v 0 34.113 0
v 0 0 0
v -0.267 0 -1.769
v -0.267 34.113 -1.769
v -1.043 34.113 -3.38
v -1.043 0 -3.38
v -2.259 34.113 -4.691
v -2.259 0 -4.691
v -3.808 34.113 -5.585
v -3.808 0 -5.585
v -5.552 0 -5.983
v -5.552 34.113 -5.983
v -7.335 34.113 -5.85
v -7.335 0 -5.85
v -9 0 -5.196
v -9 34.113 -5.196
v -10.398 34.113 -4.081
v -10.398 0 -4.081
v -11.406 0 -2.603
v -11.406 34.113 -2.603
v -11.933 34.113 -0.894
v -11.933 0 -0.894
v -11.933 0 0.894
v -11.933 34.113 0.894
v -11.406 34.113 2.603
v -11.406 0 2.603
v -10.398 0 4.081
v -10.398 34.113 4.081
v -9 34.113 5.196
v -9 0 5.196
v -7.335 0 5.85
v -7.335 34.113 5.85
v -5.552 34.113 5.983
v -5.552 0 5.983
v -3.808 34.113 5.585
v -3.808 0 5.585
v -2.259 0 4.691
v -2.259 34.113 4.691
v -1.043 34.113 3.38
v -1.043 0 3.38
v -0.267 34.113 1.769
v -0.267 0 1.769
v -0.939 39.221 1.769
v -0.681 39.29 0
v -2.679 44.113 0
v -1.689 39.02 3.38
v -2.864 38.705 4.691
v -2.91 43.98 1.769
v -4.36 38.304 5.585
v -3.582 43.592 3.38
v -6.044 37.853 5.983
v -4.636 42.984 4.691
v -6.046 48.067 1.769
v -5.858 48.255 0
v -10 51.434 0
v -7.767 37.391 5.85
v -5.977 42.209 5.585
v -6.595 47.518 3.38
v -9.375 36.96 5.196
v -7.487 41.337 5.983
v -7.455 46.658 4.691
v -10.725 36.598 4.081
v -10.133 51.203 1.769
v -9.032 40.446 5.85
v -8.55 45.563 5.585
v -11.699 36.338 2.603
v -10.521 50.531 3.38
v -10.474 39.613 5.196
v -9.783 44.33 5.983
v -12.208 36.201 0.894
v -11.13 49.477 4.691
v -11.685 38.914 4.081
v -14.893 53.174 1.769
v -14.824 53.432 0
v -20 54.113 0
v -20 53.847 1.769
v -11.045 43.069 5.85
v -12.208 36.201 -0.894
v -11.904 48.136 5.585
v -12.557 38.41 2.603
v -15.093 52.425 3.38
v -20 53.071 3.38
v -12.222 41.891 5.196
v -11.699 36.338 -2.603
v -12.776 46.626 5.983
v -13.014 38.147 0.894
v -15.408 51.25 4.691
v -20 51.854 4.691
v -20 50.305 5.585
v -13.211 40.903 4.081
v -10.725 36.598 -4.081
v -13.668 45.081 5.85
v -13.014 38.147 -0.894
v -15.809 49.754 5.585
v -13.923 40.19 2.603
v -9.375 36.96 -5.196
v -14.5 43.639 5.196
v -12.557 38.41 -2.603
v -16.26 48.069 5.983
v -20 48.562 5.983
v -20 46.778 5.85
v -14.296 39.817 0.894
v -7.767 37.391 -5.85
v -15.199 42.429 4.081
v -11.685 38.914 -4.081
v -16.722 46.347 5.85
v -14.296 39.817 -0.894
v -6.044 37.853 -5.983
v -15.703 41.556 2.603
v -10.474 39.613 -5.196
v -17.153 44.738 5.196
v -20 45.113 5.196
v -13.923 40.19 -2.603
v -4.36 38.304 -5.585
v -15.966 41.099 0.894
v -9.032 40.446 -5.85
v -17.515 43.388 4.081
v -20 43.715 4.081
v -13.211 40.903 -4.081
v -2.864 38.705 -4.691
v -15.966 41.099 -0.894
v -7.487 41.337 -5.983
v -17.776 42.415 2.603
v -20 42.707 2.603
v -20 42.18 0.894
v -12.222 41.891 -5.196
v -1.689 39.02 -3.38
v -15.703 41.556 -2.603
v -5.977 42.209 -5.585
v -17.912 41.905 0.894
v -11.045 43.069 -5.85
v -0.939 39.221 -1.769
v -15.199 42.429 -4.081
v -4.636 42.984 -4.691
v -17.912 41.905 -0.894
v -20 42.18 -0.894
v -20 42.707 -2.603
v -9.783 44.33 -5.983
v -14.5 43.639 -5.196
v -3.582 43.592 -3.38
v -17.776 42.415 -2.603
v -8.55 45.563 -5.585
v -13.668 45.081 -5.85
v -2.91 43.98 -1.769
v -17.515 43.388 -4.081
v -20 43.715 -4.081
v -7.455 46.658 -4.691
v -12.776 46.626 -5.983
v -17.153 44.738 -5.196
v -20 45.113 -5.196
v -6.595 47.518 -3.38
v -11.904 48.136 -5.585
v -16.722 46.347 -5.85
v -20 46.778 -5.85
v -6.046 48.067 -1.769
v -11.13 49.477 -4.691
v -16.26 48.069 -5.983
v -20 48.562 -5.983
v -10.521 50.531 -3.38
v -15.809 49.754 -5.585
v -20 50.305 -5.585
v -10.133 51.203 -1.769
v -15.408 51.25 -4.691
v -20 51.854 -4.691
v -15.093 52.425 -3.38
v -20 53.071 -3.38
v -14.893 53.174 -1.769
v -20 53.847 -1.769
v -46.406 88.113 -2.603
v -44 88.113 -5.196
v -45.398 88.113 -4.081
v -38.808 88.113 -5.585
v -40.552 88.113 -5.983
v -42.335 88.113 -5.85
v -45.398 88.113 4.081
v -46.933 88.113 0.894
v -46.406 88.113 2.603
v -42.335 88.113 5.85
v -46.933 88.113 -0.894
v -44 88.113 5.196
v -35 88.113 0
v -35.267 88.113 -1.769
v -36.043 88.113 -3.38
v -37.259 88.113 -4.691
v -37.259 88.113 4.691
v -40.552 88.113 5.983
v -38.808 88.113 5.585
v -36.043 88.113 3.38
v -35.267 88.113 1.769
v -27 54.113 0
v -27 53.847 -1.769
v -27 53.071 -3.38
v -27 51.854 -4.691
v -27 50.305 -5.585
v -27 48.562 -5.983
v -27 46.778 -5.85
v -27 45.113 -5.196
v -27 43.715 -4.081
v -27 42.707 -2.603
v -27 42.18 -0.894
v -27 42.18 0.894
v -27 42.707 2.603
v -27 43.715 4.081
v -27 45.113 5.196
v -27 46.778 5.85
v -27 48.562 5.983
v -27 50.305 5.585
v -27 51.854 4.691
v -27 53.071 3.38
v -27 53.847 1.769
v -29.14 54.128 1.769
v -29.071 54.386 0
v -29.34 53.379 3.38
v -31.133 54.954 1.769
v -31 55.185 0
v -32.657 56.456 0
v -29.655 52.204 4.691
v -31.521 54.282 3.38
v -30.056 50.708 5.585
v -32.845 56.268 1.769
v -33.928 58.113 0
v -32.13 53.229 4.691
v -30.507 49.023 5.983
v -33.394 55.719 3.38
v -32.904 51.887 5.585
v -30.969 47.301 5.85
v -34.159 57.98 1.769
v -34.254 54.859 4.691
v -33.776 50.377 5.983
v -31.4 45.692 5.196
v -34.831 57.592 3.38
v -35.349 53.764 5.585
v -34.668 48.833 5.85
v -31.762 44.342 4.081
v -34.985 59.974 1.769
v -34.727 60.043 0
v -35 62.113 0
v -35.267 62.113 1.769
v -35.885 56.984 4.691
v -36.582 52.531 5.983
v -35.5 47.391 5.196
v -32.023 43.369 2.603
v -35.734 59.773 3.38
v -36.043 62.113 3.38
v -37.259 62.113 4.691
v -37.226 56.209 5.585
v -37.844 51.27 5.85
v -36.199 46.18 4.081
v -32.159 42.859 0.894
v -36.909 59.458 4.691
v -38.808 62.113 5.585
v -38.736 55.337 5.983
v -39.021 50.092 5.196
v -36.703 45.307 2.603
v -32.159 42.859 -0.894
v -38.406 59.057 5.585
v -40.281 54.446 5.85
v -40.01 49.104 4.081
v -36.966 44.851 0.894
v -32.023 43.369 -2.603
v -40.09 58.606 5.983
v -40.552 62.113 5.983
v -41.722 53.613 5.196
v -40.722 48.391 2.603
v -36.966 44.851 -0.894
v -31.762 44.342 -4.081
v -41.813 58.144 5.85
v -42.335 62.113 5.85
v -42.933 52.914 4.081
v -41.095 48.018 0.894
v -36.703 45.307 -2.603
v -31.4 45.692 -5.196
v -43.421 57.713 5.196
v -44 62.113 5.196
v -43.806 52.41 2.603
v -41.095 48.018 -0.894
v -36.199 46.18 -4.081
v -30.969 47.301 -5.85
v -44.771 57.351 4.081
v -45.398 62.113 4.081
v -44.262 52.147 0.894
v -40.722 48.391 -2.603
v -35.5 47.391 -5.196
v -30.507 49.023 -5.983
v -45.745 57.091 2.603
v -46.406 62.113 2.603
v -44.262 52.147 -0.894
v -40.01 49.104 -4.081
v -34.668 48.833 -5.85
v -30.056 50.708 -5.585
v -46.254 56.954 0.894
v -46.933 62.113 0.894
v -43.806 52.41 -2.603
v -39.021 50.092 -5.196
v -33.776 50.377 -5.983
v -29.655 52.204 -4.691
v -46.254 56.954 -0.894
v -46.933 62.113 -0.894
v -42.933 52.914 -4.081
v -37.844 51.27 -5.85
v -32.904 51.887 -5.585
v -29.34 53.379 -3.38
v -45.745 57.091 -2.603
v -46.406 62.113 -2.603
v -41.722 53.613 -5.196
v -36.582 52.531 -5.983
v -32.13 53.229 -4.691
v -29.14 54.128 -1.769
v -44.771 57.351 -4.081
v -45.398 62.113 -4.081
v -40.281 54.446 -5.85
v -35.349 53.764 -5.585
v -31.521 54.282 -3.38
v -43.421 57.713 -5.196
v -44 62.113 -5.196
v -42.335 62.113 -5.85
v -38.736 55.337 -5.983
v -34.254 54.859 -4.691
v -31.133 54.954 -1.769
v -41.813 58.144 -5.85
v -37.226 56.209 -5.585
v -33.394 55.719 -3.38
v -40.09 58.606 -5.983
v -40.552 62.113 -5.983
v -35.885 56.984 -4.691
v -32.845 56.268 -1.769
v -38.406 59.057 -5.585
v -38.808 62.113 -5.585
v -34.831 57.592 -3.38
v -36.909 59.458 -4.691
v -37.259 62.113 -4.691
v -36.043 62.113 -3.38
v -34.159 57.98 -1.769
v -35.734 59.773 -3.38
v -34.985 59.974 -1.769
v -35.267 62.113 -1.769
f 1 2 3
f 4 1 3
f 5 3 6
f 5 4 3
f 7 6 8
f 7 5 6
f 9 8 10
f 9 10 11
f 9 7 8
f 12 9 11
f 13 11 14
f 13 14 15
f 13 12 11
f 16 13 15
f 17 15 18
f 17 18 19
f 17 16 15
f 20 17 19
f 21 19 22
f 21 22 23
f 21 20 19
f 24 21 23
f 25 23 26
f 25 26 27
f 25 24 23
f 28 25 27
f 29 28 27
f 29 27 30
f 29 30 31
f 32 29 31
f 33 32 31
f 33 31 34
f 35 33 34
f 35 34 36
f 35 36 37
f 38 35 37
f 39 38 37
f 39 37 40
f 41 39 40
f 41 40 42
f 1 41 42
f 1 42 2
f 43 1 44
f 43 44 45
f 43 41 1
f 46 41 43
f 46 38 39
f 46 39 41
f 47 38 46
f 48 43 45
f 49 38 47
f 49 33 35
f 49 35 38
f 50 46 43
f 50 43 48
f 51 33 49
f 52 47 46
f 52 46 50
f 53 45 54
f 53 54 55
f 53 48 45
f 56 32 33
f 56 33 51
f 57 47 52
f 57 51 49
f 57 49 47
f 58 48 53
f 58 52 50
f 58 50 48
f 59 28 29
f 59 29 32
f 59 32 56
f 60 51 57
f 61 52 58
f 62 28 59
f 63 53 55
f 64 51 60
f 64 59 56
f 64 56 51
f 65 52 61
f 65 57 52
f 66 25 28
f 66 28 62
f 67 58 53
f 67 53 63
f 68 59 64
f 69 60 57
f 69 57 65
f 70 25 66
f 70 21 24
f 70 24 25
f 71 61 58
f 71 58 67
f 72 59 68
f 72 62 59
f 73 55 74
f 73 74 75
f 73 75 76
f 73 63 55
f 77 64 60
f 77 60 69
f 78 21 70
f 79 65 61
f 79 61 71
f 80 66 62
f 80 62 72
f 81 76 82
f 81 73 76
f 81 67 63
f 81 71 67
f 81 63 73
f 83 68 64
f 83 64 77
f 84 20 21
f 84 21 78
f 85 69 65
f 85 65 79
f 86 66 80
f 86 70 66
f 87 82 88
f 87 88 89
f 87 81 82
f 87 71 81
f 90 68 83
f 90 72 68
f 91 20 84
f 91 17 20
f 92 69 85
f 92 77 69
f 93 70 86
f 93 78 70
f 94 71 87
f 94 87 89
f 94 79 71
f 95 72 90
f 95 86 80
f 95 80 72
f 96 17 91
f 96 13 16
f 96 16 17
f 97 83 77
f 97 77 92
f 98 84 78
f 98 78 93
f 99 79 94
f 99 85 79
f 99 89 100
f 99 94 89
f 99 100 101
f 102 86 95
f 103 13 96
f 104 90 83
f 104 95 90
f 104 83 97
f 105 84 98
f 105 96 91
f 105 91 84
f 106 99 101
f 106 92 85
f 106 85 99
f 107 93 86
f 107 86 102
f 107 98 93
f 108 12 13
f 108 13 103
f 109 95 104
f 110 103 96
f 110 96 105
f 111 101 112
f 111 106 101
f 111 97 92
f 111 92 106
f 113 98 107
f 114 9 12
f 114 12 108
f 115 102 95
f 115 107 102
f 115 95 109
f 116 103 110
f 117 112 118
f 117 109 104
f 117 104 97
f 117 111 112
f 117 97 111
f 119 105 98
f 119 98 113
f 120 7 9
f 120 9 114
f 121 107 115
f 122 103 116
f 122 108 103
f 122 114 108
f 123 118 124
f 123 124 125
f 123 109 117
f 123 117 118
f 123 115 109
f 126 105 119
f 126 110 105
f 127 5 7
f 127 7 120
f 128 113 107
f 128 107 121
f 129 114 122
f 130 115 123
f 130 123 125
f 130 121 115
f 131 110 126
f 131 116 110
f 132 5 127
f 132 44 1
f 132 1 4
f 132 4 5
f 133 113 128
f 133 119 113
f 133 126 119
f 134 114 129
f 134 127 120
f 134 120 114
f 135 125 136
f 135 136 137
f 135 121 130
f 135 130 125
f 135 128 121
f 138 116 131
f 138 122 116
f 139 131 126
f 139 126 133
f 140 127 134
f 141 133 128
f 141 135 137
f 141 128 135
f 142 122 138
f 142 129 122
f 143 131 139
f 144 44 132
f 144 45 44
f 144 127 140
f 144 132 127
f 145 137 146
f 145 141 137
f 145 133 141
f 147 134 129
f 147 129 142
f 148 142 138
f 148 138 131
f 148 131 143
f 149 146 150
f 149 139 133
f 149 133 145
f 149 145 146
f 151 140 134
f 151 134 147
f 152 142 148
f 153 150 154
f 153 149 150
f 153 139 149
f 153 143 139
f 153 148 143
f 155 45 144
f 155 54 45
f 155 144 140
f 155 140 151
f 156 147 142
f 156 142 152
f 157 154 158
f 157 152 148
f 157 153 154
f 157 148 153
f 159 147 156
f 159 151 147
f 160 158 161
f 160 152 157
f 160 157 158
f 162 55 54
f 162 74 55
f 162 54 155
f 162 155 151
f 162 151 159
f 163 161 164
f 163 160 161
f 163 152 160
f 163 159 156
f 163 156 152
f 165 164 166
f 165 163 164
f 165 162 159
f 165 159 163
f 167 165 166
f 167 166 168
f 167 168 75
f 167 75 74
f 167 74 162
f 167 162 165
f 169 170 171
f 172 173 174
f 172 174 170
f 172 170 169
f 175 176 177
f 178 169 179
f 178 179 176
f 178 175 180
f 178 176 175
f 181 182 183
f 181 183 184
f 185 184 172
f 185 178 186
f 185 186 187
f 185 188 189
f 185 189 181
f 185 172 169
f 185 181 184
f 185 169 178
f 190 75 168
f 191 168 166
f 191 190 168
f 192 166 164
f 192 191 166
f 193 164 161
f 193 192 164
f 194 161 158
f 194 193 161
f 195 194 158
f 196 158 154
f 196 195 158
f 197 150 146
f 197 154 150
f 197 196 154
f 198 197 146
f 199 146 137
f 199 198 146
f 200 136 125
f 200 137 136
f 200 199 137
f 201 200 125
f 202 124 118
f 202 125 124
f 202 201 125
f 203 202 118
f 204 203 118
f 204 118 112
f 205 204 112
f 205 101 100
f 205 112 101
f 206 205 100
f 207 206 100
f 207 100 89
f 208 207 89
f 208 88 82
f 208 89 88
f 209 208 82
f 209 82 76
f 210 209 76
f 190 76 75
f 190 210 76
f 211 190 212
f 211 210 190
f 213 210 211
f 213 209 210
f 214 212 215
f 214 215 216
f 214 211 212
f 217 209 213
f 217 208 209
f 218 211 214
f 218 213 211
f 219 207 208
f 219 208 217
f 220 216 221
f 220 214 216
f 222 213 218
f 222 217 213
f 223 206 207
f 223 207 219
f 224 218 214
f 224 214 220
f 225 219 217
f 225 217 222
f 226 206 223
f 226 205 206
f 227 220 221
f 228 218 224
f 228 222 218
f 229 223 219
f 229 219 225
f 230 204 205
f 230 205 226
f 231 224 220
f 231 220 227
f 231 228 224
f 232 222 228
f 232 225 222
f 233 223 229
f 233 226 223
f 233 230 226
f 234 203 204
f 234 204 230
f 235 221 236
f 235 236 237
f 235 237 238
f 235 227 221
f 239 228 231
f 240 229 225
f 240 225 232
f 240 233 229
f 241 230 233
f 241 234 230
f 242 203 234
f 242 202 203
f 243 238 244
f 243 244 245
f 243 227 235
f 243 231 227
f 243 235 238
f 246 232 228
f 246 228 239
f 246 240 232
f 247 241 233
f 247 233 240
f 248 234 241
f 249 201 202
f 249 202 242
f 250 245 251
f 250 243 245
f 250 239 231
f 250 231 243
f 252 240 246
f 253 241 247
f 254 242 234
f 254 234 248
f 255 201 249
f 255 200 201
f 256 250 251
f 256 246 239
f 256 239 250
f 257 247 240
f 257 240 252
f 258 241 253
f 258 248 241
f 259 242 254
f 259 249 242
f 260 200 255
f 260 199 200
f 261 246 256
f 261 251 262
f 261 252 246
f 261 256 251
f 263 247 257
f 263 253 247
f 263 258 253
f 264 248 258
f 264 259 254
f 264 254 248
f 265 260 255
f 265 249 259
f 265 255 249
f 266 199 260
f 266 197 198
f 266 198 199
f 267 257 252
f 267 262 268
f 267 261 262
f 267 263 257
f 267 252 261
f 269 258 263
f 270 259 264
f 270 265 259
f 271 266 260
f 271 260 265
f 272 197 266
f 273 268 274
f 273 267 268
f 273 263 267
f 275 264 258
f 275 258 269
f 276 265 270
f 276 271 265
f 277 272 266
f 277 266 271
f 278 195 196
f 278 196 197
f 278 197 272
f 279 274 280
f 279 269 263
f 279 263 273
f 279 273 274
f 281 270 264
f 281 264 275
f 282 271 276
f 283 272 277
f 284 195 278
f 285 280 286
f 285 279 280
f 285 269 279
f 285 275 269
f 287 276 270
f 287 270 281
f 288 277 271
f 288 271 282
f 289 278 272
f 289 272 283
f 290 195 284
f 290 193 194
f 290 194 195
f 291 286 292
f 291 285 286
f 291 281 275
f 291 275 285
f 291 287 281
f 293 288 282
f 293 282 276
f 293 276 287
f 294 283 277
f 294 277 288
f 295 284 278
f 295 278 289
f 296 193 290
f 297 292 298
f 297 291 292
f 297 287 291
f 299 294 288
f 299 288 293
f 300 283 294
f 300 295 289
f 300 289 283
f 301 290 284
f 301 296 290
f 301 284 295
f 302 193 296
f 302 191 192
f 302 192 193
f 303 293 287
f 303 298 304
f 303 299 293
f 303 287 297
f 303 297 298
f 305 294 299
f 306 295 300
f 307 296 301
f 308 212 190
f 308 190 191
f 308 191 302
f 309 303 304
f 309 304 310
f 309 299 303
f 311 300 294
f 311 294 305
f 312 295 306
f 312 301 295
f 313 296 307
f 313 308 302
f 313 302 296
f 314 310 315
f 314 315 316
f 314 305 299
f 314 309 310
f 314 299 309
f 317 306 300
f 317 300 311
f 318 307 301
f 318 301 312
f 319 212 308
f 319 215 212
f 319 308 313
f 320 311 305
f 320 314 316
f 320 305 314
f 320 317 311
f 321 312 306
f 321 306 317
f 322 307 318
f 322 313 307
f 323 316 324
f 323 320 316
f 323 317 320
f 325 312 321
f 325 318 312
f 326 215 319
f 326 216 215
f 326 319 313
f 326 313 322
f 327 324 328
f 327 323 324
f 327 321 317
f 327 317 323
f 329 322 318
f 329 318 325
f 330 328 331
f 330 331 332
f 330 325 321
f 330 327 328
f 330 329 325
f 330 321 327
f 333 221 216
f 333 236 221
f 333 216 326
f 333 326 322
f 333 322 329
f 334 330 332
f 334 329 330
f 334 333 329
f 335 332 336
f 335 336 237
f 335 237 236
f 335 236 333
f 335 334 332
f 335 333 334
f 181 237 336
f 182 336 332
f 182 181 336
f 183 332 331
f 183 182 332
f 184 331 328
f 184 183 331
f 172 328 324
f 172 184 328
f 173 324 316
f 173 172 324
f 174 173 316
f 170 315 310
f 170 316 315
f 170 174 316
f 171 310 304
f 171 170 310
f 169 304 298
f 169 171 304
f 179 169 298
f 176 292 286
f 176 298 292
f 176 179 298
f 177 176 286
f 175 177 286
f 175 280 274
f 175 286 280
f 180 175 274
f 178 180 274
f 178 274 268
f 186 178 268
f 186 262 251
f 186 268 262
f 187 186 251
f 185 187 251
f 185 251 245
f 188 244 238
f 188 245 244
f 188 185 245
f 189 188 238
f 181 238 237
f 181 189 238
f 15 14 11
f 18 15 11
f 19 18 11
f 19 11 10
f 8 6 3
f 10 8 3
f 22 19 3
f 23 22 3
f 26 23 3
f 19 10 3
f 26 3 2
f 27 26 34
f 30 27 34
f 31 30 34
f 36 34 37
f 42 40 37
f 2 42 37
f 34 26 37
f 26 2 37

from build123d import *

# Parameters (mm, degrees)
SKETCH_1_R = 6


with BuildPart() as part:
    # По траектории1: sweep along a path in Эскиз2
    with BuildLine(Plane.XY) as sweep_1_path:
        Line((-6, 0), (-6, 34.113207547))
        ThreePointArc((-6, 34.113207547), (-10.100505063, 44.012702484), (-20, 48.113207547))
        Line((-20, 48.113207547), (-27, 48.113207547))
        ThreePointArc((-27, 48.113207547), (-36.899494937, 52.213712611), (-41, 62.113207547))
        Line((-41, 62.113207547), (-41, 88.113207547))
    # Эскиз1 → По траектории1 (sweep)
    with BuildSketch(Plane(origin=(0, 0, 0), x_dir=(1, 0, 0), z_dir=(0, 1, 0))):
        with Locations((-6, 0)):
            Circle(SKETCH_1_R)
    sweep(path=sweep_1_path.line)


solid = part.part
